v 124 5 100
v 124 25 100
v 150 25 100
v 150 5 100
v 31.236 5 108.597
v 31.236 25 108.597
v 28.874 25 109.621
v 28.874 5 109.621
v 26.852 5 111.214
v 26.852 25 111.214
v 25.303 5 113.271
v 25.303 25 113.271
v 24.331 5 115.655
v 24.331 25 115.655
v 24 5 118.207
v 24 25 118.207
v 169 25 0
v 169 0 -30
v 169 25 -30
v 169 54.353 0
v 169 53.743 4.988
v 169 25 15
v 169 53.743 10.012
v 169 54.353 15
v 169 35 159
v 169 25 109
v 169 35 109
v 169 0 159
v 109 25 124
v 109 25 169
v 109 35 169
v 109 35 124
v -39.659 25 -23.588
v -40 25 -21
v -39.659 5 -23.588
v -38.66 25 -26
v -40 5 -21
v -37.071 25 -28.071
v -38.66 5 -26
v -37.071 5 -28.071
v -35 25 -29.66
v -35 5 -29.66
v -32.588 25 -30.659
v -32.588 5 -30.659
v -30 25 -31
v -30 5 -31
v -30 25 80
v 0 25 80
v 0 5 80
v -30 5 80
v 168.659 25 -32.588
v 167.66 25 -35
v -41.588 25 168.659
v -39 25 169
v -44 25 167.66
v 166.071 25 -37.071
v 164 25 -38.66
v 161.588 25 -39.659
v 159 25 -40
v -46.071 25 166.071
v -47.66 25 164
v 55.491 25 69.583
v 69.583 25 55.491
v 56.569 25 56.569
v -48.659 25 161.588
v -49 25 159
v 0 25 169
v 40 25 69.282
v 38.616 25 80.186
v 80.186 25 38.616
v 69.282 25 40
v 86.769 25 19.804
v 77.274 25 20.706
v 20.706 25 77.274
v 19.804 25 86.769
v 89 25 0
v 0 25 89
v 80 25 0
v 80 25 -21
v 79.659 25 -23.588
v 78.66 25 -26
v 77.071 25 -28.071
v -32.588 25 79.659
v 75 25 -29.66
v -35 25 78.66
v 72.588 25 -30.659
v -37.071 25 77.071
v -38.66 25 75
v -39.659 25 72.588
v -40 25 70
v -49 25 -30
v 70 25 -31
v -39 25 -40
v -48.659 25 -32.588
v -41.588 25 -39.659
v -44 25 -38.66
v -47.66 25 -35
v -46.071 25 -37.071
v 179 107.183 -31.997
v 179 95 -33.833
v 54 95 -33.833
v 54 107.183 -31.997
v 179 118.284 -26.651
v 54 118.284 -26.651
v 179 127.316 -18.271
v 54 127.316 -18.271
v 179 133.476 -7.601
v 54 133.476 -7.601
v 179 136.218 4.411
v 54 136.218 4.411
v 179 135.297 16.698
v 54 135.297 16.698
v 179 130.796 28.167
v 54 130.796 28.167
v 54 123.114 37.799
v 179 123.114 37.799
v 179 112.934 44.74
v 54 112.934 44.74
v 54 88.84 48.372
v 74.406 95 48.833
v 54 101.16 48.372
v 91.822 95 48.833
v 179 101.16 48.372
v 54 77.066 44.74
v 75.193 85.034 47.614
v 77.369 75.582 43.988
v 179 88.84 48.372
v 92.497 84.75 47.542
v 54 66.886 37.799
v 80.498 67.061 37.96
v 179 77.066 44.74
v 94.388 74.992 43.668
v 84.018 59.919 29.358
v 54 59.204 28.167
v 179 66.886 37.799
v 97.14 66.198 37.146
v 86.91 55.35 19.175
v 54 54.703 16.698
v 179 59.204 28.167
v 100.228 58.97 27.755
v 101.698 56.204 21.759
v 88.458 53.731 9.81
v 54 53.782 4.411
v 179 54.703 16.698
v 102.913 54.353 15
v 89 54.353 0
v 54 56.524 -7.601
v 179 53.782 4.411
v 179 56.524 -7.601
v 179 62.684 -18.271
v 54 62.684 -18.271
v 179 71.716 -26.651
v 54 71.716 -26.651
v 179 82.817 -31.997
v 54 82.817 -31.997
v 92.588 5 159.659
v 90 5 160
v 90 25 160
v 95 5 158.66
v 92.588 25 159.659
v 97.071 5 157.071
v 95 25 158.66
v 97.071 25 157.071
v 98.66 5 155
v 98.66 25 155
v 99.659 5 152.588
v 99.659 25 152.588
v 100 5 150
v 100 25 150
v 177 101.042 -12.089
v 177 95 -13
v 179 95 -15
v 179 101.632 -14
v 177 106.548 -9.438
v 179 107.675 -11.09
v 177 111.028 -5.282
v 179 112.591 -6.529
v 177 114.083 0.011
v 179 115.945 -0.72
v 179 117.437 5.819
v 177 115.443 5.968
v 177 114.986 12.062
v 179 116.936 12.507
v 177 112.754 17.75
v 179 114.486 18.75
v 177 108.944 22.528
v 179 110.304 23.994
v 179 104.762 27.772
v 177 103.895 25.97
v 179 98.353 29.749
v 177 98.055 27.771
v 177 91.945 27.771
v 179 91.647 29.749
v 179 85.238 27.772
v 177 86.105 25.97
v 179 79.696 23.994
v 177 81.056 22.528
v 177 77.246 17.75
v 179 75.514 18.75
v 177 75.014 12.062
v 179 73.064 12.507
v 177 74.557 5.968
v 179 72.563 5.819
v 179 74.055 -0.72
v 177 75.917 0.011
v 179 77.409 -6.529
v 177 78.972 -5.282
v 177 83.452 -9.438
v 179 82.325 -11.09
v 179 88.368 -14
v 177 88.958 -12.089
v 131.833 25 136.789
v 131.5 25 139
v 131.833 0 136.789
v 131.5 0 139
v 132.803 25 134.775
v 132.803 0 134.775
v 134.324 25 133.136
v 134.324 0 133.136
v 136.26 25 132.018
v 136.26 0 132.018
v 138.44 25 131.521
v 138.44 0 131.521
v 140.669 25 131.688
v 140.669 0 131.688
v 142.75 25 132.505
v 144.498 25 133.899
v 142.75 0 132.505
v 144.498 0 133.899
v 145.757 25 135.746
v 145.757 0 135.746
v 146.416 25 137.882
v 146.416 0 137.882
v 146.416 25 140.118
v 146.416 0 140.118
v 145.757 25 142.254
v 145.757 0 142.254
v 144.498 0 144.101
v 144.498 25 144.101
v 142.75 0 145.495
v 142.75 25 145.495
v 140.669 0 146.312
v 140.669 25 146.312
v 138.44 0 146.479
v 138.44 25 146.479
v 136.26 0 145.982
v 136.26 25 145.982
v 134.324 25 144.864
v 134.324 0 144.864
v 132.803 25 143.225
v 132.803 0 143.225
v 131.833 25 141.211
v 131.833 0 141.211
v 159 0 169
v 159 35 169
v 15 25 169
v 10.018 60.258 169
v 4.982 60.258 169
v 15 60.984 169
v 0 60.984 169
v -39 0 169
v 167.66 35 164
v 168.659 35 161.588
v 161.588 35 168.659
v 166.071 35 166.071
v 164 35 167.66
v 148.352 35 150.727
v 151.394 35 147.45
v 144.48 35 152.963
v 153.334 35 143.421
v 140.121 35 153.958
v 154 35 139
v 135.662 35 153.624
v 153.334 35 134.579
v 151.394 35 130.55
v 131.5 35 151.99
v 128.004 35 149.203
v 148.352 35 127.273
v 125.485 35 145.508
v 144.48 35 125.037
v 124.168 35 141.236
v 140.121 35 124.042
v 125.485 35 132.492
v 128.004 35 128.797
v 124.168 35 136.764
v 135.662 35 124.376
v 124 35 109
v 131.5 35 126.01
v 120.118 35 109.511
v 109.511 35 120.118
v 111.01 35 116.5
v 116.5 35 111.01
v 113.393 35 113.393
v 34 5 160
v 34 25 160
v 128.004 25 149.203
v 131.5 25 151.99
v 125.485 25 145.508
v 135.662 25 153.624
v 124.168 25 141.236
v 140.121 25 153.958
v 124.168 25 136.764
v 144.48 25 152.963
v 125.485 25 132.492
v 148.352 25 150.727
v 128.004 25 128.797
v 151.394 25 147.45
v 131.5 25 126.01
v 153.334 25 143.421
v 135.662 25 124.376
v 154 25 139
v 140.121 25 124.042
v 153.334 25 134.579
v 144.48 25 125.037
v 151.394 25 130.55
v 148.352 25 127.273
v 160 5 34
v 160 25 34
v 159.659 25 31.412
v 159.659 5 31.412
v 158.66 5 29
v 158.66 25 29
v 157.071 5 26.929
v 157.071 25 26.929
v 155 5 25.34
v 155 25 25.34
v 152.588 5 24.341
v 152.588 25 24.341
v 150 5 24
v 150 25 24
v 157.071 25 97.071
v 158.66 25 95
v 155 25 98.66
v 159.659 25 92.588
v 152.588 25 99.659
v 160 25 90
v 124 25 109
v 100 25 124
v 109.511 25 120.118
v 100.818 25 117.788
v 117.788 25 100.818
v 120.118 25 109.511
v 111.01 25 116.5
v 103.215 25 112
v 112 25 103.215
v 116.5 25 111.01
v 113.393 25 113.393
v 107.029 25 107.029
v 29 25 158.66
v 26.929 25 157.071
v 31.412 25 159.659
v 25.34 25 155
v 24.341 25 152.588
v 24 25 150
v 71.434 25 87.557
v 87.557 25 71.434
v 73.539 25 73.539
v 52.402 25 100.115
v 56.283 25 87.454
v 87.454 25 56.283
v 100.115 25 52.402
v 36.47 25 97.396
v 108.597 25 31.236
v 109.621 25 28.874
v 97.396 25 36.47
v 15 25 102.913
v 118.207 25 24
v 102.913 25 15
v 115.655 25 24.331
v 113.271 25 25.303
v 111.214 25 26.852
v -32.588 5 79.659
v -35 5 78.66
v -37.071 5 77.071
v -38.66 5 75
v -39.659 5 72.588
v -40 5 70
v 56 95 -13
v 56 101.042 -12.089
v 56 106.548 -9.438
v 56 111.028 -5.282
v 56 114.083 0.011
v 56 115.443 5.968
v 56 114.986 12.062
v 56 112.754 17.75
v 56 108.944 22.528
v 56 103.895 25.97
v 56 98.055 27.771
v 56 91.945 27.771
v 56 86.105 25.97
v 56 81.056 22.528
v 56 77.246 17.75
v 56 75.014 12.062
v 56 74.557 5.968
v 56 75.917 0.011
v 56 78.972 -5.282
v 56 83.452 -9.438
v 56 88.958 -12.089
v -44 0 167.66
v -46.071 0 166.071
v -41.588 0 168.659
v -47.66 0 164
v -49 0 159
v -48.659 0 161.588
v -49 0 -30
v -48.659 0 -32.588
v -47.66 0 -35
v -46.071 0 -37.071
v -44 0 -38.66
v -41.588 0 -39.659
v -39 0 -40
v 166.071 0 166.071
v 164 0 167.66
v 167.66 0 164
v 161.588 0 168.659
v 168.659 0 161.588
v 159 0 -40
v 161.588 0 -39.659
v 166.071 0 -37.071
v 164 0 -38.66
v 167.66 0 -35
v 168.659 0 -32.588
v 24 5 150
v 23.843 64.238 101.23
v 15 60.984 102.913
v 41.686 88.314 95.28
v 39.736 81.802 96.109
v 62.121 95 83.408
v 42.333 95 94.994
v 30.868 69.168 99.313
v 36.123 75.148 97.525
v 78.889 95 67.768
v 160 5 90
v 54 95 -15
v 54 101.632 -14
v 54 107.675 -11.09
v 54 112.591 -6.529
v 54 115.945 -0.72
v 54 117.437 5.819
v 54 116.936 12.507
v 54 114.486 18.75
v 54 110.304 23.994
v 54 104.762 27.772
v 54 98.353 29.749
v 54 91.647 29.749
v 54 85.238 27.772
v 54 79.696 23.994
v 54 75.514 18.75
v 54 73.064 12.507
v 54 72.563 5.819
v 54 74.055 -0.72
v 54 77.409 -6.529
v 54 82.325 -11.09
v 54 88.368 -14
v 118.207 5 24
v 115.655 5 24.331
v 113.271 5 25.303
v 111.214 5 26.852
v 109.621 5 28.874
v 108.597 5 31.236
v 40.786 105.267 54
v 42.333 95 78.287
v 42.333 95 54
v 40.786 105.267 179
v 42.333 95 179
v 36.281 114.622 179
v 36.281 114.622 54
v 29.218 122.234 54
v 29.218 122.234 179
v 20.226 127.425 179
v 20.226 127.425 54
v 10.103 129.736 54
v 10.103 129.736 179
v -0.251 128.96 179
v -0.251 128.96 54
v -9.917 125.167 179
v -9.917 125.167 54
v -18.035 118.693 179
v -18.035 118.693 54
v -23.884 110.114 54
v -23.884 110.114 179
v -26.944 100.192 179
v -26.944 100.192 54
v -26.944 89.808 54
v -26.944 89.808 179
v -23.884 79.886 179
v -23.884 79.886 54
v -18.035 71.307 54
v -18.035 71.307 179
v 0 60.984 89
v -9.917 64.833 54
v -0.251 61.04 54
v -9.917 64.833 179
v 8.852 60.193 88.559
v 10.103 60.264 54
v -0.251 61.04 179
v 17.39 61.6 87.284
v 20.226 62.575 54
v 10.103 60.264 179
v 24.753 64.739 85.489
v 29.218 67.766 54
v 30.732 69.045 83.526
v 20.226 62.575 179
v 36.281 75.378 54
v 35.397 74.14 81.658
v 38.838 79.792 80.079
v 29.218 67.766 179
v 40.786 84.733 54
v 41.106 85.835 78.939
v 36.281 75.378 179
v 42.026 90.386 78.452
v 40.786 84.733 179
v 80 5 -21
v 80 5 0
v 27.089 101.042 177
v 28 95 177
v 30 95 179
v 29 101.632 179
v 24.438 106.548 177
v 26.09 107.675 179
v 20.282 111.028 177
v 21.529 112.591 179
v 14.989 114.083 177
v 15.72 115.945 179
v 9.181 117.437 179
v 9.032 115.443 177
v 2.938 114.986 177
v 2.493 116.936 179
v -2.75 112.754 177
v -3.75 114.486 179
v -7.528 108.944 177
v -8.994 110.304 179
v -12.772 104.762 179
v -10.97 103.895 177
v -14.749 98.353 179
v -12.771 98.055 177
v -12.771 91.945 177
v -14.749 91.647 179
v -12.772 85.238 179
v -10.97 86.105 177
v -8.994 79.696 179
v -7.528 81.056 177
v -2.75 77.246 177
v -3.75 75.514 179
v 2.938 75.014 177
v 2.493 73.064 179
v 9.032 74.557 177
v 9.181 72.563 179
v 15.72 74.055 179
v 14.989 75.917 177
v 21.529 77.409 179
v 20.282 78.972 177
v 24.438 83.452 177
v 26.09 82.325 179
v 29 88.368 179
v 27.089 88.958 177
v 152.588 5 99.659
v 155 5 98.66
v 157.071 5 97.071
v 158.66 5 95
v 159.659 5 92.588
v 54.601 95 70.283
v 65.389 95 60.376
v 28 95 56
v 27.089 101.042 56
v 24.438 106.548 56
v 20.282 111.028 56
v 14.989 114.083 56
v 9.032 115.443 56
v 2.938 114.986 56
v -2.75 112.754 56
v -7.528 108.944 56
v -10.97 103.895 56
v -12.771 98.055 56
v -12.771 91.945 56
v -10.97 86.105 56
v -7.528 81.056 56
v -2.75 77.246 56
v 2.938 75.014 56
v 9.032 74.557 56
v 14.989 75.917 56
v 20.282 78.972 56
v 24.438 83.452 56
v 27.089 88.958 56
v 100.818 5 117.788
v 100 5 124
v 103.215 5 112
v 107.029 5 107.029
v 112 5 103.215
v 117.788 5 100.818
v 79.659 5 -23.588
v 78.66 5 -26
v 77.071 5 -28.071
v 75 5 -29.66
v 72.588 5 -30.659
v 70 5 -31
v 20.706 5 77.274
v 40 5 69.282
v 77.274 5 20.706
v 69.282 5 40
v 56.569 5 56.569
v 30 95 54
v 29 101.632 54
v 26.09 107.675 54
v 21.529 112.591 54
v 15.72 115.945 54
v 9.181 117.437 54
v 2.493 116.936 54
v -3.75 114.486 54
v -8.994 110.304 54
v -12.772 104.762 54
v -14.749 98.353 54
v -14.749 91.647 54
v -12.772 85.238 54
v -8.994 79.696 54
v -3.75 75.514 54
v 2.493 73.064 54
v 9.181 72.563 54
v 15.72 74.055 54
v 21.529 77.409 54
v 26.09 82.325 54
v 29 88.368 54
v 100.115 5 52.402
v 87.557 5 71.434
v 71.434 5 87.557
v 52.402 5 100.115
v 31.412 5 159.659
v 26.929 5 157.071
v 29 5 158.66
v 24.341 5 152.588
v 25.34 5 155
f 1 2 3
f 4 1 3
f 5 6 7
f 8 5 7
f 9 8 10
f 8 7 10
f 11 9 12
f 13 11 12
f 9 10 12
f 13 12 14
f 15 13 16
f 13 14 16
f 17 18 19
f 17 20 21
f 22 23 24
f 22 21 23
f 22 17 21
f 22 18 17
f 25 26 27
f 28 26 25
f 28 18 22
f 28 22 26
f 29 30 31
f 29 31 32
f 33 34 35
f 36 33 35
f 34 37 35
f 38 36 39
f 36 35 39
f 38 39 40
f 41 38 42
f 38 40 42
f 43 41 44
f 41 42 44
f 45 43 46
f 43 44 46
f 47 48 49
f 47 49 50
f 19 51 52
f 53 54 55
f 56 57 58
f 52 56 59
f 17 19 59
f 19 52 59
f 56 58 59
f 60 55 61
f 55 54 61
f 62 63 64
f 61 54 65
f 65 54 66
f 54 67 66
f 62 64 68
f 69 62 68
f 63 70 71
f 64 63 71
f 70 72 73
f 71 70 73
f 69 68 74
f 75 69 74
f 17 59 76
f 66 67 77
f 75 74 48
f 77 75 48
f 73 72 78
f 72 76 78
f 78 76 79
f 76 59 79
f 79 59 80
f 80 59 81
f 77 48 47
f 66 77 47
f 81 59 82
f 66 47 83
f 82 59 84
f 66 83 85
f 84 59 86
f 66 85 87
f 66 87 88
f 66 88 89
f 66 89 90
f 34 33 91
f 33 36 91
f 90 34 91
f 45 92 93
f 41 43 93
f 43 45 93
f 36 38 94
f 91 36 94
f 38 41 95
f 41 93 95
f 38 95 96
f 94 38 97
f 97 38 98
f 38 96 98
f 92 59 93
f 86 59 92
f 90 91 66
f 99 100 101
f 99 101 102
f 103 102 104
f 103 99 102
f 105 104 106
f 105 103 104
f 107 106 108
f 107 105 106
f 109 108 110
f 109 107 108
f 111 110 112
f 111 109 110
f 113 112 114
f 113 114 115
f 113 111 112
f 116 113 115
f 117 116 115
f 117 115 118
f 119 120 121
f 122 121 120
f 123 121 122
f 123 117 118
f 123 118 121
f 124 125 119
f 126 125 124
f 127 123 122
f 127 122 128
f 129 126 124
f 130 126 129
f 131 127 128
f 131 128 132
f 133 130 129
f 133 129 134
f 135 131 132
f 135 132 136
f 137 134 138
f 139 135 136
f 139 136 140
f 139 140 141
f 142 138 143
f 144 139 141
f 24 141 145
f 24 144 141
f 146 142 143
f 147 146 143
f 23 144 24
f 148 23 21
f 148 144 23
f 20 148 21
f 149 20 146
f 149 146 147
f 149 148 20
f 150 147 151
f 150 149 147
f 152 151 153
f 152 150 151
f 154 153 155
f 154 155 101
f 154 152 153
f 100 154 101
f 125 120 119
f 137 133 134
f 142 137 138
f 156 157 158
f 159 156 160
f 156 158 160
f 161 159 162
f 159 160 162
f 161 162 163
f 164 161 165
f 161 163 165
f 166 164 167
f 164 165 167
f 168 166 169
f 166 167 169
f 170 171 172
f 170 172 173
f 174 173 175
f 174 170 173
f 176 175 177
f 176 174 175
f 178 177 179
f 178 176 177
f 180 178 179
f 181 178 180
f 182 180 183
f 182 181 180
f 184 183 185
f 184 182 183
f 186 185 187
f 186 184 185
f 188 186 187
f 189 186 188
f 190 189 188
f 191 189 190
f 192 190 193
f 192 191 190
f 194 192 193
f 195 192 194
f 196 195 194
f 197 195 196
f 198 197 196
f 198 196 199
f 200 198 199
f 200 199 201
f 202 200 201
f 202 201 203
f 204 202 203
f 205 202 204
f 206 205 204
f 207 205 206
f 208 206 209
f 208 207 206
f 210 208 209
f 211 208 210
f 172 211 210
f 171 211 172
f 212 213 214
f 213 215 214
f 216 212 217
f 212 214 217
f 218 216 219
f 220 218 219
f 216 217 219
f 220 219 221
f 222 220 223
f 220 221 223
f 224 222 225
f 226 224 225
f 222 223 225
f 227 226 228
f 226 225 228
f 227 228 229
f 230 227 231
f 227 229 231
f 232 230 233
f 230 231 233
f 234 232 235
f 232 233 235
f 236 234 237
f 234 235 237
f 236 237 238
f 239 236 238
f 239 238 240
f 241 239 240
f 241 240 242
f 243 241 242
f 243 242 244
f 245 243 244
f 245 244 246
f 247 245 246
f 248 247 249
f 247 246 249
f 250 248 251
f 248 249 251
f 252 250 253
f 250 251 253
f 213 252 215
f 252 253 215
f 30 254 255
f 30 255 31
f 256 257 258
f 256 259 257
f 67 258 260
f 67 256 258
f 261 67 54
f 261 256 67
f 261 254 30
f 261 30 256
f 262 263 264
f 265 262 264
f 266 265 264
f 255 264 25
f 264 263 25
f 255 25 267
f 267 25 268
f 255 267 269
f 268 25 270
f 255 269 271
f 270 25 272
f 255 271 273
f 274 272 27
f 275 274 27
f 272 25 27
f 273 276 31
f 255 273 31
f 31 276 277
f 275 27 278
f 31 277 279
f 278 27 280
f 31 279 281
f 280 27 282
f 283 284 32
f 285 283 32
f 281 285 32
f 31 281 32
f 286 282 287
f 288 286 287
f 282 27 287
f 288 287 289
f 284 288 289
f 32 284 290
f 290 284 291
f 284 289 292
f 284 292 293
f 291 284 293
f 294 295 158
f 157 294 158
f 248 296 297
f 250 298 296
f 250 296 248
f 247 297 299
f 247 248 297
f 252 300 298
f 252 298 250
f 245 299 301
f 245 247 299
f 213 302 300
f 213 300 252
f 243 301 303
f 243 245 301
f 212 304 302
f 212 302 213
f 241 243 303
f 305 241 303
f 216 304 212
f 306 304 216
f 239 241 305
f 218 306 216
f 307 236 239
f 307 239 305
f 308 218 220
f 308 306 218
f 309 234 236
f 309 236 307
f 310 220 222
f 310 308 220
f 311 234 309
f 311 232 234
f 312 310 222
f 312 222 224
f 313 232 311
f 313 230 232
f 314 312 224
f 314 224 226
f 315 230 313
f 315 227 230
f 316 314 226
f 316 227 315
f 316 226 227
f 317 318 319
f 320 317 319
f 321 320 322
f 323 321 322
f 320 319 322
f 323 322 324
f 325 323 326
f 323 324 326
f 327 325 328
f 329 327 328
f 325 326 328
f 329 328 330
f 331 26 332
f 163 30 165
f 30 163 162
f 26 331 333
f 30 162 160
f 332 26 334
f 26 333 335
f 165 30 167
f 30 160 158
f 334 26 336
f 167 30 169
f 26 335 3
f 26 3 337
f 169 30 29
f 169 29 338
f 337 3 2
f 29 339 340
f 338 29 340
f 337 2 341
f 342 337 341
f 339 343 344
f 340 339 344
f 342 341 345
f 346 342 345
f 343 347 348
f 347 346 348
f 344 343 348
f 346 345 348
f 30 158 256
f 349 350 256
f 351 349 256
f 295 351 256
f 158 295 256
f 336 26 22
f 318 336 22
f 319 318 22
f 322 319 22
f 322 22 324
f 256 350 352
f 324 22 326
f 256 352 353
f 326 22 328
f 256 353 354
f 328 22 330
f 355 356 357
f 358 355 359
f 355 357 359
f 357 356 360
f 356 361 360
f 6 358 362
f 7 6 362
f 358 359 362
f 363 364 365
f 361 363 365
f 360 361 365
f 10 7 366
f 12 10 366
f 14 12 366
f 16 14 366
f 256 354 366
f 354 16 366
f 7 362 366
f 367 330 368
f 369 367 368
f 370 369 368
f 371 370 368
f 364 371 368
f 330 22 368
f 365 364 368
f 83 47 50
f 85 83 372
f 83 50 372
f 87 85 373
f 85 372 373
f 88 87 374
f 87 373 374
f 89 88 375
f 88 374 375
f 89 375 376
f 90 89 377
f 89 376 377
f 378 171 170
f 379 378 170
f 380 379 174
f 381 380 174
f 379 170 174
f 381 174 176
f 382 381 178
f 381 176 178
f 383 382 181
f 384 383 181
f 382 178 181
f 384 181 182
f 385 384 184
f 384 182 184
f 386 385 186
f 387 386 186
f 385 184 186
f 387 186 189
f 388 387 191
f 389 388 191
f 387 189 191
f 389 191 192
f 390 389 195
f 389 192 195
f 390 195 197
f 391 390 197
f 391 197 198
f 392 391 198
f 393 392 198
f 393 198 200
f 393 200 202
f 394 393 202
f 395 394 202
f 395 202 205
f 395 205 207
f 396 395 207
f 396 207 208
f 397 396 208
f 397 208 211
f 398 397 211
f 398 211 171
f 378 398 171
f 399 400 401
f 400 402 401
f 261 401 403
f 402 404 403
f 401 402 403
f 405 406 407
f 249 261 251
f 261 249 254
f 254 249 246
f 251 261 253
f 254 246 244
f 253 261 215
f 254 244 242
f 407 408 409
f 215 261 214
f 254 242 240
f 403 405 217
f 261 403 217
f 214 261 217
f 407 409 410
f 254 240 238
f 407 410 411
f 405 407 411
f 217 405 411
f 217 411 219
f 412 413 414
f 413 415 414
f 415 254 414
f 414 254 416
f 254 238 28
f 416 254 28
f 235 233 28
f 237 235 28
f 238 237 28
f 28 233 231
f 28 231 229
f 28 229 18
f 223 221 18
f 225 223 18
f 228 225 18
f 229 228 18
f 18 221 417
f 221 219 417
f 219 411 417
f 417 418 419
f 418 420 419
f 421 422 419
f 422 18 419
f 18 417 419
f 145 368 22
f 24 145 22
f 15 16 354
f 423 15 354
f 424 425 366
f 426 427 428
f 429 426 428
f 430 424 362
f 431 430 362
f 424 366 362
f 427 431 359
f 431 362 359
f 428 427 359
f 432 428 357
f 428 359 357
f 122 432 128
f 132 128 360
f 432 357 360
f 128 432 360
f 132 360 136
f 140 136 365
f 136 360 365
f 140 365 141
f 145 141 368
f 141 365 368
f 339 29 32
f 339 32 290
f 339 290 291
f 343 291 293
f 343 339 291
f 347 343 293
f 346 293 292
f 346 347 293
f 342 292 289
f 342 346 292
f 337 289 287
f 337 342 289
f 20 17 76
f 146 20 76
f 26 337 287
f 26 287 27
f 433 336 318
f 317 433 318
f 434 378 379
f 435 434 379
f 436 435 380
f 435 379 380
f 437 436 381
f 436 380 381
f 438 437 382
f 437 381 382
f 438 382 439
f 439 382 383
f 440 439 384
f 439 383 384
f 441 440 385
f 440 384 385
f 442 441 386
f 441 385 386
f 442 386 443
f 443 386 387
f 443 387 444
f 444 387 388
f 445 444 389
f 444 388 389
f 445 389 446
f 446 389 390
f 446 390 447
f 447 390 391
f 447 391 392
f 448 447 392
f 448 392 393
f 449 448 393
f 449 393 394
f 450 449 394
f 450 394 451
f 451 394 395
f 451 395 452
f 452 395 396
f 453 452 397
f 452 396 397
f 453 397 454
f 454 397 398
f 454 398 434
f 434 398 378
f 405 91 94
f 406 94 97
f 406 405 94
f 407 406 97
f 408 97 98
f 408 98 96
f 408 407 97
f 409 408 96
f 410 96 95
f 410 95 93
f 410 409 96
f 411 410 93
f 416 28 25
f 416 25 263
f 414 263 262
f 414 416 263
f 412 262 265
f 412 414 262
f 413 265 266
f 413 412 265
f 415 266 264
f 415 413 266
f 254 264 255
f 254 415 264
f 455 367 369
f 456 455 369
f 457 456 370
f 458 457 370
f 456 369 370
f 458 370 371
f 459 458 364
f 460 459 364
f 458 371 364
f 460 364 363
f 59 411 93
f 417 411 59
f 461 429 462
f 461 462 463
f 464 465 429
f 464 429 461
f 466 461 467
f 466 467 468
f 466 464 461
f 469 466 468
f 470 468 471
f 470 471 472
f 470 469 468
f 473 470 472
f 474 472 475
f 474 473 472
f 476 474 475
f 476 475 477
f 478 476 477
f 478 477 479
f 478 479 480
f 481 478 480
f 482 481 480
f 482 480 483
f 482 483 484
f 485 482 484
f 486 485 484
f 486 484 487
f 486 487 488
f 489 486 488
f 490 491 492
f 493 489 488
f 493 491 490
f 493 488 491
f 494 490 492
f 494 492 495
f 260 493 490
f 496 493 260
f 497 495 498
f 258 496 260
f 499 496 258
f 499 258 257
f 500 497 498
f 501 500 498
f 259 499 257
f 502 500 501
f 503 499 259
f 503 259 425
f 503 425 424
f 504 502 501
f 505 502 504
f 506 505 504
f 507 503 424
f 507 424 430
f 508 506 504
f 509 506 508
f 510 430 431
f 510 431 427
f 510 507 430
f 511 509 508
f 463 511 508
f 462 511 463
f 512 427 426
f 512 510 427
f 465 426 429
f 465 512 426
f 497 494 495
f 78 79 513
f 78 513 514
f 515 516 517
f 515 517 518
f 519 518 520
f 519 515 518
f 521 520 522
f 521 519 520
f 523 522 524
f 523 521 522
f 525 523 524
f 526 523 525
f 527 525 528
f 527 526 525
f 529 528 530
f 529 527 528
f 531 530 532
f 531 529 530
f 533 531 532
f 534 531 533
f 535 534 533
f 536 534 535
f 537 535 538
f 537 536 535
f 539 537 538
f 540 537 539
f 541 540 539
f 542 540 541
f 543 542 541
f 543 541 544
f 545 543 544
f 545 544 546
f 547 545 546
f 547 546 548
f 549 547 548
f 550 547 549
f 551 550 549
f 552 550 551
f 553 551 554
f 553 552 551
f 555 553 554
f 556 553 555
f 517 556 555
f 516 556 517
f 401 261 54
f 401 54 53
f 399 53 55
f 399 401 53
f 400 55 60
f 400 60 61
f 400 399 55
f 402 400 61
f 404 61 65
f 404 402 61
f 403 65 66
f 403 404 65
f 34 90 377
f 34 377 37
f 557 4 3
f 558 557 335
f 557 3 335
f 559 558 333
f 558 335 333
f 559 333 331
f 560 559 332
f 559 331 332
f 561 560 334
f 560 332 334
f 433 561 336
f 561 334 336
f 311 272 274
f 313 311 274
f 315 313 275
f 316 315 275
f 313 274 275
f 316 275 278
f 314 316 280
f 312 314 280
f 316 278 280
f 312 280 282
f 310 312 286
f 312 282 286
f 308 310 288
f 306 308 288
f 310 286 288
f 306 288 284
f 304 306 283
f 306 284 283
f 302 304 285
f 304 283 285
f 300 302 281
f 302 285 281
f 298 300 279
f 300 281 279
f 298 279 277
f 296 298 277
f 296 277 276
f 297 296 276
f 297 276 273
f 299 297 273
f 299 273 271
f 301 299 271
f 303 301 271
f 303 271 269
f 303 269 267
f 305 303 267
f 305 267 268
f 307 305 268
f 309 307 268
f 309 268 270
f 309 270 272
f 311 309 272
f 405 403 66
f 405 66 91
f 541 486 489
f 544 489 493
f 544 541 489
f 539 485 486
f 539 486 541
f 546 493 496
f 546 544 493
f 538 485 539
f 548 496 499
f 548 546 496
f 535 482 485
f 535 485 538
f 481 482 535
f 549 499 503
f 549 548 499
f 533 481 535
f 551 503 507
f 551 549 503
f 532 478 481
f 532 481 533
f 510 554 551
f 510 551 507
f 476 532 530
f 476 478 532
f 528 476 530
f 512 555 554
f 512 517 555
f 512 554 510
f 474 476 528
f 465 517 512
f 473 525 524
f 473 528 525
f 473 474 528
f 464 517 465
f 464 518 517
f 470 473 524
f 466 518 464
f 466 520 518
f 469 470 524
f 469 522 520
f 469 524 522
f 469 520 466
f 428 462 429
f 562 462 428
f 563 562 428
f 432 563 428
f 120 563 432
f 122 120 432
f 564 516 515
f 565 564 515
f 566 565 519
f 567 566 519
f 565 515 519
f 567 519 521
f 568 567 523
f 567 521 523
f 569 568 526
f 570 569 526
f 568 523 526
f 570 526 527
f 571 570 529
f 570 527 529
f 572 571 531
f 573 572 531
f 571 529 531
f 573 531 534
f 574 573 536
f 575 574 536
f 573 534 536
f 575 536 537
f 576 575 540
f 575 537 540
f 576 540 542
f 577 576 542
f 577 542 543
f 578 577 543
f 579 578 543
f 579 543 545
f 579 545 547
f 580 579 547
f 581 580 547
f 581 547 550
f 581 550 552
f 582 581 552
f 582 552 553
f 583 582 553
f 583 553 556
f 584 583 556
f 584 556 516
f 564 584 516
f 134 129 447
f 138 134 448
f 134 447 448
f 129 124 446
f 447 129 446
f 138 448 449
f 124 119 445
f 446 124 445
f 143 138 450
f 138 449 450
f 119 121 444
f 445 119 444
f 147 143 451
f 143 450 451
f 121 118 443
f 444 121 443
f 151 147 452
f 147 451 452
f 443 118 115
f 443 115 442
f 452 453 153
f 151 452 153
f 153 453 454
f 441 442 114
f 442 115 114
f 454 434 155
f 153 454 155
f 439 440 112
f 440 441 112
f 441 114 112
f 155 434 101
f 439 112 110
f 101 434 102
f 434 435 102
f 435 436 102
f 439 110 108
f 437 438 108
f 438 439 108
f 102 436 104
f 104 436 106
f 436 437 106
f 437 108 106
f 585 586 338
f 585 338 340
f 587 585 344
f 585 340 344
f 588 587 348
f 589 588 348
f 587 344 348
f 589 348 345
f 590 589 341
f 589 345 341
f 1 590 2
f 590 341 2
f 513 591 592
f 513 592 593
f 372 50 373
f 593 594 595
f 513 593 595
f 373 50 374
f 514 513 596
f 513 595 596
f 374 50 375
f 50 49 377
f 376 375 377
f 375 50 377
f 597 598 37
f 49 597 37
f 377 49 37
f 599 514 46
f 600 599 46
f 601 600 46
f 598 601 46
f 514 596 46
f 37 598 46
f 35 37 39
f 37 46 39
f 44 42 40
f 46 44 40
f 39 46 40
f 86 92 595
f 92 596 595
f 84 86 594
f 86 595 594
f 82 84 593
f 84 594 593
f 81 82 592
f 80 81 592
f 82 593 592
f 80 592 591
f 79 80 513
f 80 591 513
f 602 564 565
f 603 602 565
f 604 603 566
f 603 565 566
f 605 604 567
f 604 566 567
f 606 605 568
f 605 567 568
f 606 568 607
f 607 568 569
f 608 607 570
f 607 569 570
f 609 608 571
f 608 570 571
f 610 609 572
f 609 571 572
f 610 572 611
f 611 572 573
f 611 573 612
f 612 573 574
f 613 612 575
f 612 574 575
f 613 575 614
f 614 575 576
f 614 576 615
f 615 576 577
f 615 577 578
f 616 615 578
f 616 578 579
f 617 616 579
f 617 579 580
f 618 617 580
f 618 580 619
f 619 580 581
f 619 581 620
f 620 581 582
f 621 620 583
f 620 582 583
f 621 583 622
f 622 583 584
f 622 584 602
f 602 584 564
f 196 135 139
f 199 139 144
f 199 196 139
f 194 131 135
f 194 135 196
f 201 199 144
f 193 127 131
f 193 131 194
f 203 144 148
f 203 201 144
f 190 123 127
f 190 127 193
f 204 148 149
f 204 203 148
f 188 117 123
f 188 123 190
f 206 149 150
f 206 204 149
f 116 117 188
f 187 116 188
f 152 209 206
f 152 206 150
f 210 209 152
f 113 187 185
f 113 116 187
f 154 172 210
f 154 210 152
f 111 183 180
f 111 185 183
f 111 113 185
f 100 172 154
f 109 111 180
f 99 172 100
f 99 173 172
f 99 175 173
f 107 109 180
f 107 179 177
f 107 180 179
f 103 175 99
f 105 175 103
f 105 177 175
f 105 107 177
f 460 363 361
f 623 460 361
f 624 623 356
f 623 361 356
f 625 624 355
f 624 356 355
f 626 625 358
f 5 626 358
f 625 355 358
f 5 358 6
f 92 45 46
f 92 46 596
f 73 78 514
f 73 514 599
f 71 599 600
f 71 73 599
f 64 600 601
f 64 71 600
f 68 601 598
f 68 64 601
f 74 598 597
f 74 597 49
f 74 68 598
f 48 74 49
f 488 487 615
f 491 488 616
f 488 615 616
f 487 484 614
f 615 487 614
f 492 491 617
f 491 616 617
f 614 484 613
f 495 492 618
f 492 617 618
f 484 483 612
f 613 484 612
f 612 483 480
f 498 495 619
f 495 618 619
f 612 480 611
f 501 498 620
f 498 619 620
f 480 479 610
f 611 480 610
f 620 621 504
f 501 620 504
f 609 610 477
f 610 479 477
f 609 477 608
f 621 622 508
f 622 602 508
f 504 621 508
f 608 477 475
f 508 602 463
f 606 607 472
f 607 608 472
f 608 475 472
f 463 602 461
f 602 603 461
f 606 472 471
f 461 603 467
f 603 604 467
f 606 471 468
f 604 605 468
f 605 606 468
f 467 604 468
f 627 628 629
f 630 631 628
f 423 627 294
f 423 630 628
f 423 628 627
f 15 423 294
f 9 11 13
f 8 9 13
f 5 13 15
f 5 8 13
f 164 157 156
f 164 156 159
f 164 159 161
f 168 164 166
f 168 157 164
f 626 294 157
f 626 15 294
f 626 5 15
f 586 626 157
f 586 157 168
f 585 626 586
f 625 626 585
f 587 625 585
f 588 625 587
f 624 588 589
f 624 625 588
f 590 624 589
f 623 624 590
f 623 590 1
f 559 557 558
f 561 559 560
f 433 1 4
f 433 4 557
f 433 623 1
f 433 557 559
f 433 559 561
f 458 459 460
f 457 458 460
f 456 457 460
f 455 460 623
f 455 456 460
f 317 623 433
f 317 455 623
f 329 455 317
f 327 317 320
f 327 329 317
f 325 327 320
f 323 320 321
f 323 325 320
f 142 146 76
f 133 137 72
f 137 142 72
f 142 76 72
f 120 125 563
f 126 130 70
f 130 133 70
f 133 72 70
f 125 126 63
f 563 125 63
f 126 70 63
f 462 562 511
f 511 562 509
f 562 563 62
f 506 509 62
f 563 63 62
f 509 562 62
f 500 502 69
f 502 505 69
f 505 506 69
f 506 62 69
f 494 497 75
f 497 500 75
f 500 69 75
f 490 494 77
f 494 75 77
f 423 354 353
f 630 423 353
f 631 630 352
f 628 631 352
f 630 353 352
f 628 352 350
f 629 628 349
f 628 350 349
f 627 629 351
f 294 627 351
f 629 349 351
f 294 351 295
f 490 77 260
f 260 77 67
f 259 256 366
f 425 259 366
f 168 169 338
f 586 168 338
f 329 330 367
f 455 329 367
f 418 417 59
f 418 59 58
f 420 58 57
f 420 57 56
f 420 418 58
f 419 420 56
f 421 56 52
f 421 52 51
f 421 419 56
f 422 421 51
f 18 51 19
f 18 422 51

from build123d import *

# Parameters (mm, degrees)
BOSS_EXTRUDE1_DEPTH                     = 25
BOSS_EXTRUDE2_START                     = -25
BOSS_EXTRUDE2_DEPTH                     = 95
BOSS_EXTRUDE3_DEPTH                     = 10
CBORE_FOR_M8_HEX_HEAD_BOLT1_D           = 15
CBORE_FOR_M8_HEX_HEAD_BOLT1_CBORE_D     = 30
CBORE_FOR_M8_HEX_HEAD_BOLT1_CBORE_DEPTH = 10
CUT_EXTRUDE1_DEPTH                      = 20
BOSS_EXTRUDE4_START                     = 10
SKETCH7_R                               = 34.833333333
BOSS_EXTRUDE4_DEPTH                     = 125
BOSS_EXTRUDE5_START                     = 10
SKETCH8_R                               = 41.333333333
BOSS_EXTRUDE5_DEPTH                     = 125
CUT_EXTRUDE2_REACH                      = 315.988
SKETCH9_R                               = 20.5
CUT_EXTRUDE3_REACH                      = 322.331
SKETCH10_R                              = 20.5
CHAMFER1_SIZE                           = 2
CUT_EXTRUDE4_DEPTH                      = 20
FILLET1_R                               = 10


with BuildPart() as part:
    # Sketch1 → Boss-Extrude1 (new body)
    with BuildSketch(Plane(origin=(0, 0, 0), x_dir=(1, 0, 0), z_dir=(0, 1, 0))):
        with BuildLine():
            Line((-39, 40), (159, 40))
            ThreePointArc((159, 40), (166.071067812, 37.071067812), (169, 30))
            Line((169, 30), (169, -159))
            ThreePointArc((169, -159), (166.071067812, -166.071067812), (159, -169))
            Line((159, -169), (-39, -169))
            ThreePointArc((-39, -169), (-46.071067812, -166.071067812), (-49, -159))
            Line((-49, -159), (-49, 30))
            ThreePointArc((-49, 30), (-46.071067812, 37.071067812), (-39, 40))
        make_face()
    extrude(amount=BOSS_EXTRUDE1_DEPTH)

    # Sketch2 → Boss-Extrude2 (add)
    with BuildSketch(Plane(origin=(0, 25, 0), x_dir=(1, 0, 0), z_dir=(0, 1, 0)).offset(BOSS_EXTRUDE2_START)):
        with BuildLine():
            Line((0, -89), (0, -169))
            Line((0, -169), (15, -169))
            Line((15, -169), (15, -102.912584265))
            ThreePointArc((15, -102.912584265), (73.539105243, -73.539105243), (102.912584265, -15))
            Line((102.912584265, -15), (169, -15))
            Line((169, -15), (169, 0))
            Line((169, 0), (89, 0))
            ThreePointArc((89, 0), (62.932503526, -62.932503526), (0, -89))
        make_face()
    extrude(amount=BOSS_EXTRUDE2_DEPTH)

    # Sketch3 → Boss-Extrude3 (add)
    with BuildSketch(Plane(origin=(0, 25, 0), x_dir=(1, 0, 0), z_dir=(0, 1, 0))):
        with BuildLine():
            Line((124, -109), (169, -109))
            Line((169, -109), (169, -159))
            ThreePointArc((169, -159), (166.071067812, -166.071067812), (159, -169))
            Line((159, -169), (109, -169))
            Line((109, -169), (109, -124))
            ThreePointArc((109, -124), (113.393398282, -113.393398282), (124, -109))
        make_face()
    extrude(amount=BOSS_EXTRUDE3_DEPTH)

    # CBORE for M8 Hex Head Bolt1 (through all)
    with Locations(Plane(origin=(0, 35, 0), x_dir=(1, 0, 0), z_dir=(0, 1, 0))):
        with Locations((139, -139)):
            CounterBoreHole(CBORE_FOR_M8_HEX_HEAD_BOLT1_D / 2, CBORE_FOR_M8_HEX_HEAD_BOLT1_CBORE_D / 2, CBORE_FOR_M8_HEX_HEAD_BOLT1_CBORE_DEPTH)

    # Sketch6 → Cut-Extrude1 (cut)
    with BuildSketch(Plane(origin=(0, 25, 0), x_dir=(1, 0, 0), z_dir=(0, 1, 0))):
        with BuildLine():
            Line((100, -150), (100, -124))
            ThreePointArc((100, -124), (107.029437252, -107.029437252), (124, -100))
            Line((124, -100), (150, -100))
            ThreePointArc((150, -100), (157.071067812, -97.071067812), (160, -90))
            Line((160, -90), (160, -34))
            ThreePointArc((160, -34), (157.071067812, -26.928932188), (150, -24))
            Line((150, -24), (118.207444774, -24))
            ThreePointArc((118.207444774, -24), (112.192558093, -26.011186683), (108.59708341, -31.235772358))
            ThreePointArc((108.59708341, -31.235772358), (79.903066274, -79.903066274), (31.235772358, -108.59708341))
            ThreePointArc((31.235772358, -108.59708341), (26.011186683, -112.192558093), (24, -118.207444774))
            Line((24, -118.207444774), (24, -150))
            ThreePointArc((24, -150), (26.928932188, -157.071067812), (34, -160))
            Line((34, -160), (90, -160))
            ThreePointArc((90, -160), (97.071067812, -157.071067812), (100, -150))
        make_face()
    extrude(amount=-CUT_EXTRUDE1_DEPTH, mode=Mode.SUBTRACT)

    # Sketch7 → Boss-Extrude4 (add)
    with BuildSketch(Plane.XY.offset(169).offset(BOSS_EXTRUDE4_START)):
        with Locations((7.5, 95)):
            Circle(SKETCH7_R)
    extrude(amount=-BOSS_EXTRUDE4_DEPTH)

    # Sketch8 → Boss-Extrude5 (add)
    with BuildSketch(Plane(origin=(169, 0, 0), x_dir=(0, 0, -1), z_dir=(1, 0, 0)).offset(BOSS_EXTRUDE5_START)):
        with Locations((-7.5, 95)):
            Circle(SKETCH8_R)
    extrude(amount=-BOSS_EXTRUDE5_DEPTH)

    # Sketch9 → Cut-Extrude2 (cut, up to next)
    with BuildSketch(Plane.XY.offset(179), mode=Mode.PRIVATE) as cut_extrude2_sk1:
        with Locations((7.5, 95)):
            Circle(SKETCH9_R)
    cut_extrude2_tool1 = extrude(cut_extrude2_sk1.sketch, amount=-CUT_EXTRUDE2_REACH, mode=Mode.PRIVATE) & part.part
    add(cut_extrude2_tool1.solids().sort_by_distance((7.5, 95, 179))[0], mode=Mode.SUBTRACT)

    # Sketch10 → Cut-Extrude3 (cut, up to next)
    with BuildSketch(Plane(origin=(179, 0, 0), x_dir=(0, 0, -1), z_dir=(1, 0, 0)), mode=Mode.PRIVATE) as cut_extrude3_sk1:
        with Locations((-7.5, 95)):
            Circle(SKETCH10_R)
    cut_extrude3_tool1 = extrude(cut_extrude3_sk1.sketch, amount=-CUT_EXTRUDE3_REACH, mode=Mode.PRIVATE) & part.part
    add(cut_extrude3_tool1.solids().sort_by_distance((179, 95, 7.5))[0], mode=Mode.SUBTRACT)

    # Chamfer1
    chamfer1_edges = [part.edges().sort_by_distance(p)[0] for p in [
        (-13, 95, 179),
        (-13, 95, 54),
        (179, 95, 28),
        (54, 95, 28),
    ]]
    chamfer(chamfer1_edges, length=CHAMFER1_SIZE)

    # Sketch11 → Cut-Extrude4 (cut)
    with BuildSketch(Plane(origin=(0, 25, 0), x_dir=(1, 0, 0), z_dir=(0, 1, 0))):
        with BuildLine():
            Line((0, -80), (-40, -80))
            Line((-40, -80), (-40, 30))
            Line((-40, 30), (-40, 31))
            Line((-40, 31), (-39, 31))
            Line((-39, 31), (80, 31))
            Line((80, 31), (80, 0))
            ThreePointArc((80, 0), (56.568542495, -56.568542495), (0, -80))
        make_face()
    extrude(amount=-CUT_EXTRUDE4_DEPTH, mode=Mode.SUBTRACT)

    # Fillet1
    fillet1_edges = [part.edges().sort_by_distance(p)[0] for p in [
        (-40, 15, 80),
        (-40, 15, -31),
        (80, 15, -31),
    ]]
    fillet(fillet1_edges, radius=FILLET1_R)


solid = part.part
